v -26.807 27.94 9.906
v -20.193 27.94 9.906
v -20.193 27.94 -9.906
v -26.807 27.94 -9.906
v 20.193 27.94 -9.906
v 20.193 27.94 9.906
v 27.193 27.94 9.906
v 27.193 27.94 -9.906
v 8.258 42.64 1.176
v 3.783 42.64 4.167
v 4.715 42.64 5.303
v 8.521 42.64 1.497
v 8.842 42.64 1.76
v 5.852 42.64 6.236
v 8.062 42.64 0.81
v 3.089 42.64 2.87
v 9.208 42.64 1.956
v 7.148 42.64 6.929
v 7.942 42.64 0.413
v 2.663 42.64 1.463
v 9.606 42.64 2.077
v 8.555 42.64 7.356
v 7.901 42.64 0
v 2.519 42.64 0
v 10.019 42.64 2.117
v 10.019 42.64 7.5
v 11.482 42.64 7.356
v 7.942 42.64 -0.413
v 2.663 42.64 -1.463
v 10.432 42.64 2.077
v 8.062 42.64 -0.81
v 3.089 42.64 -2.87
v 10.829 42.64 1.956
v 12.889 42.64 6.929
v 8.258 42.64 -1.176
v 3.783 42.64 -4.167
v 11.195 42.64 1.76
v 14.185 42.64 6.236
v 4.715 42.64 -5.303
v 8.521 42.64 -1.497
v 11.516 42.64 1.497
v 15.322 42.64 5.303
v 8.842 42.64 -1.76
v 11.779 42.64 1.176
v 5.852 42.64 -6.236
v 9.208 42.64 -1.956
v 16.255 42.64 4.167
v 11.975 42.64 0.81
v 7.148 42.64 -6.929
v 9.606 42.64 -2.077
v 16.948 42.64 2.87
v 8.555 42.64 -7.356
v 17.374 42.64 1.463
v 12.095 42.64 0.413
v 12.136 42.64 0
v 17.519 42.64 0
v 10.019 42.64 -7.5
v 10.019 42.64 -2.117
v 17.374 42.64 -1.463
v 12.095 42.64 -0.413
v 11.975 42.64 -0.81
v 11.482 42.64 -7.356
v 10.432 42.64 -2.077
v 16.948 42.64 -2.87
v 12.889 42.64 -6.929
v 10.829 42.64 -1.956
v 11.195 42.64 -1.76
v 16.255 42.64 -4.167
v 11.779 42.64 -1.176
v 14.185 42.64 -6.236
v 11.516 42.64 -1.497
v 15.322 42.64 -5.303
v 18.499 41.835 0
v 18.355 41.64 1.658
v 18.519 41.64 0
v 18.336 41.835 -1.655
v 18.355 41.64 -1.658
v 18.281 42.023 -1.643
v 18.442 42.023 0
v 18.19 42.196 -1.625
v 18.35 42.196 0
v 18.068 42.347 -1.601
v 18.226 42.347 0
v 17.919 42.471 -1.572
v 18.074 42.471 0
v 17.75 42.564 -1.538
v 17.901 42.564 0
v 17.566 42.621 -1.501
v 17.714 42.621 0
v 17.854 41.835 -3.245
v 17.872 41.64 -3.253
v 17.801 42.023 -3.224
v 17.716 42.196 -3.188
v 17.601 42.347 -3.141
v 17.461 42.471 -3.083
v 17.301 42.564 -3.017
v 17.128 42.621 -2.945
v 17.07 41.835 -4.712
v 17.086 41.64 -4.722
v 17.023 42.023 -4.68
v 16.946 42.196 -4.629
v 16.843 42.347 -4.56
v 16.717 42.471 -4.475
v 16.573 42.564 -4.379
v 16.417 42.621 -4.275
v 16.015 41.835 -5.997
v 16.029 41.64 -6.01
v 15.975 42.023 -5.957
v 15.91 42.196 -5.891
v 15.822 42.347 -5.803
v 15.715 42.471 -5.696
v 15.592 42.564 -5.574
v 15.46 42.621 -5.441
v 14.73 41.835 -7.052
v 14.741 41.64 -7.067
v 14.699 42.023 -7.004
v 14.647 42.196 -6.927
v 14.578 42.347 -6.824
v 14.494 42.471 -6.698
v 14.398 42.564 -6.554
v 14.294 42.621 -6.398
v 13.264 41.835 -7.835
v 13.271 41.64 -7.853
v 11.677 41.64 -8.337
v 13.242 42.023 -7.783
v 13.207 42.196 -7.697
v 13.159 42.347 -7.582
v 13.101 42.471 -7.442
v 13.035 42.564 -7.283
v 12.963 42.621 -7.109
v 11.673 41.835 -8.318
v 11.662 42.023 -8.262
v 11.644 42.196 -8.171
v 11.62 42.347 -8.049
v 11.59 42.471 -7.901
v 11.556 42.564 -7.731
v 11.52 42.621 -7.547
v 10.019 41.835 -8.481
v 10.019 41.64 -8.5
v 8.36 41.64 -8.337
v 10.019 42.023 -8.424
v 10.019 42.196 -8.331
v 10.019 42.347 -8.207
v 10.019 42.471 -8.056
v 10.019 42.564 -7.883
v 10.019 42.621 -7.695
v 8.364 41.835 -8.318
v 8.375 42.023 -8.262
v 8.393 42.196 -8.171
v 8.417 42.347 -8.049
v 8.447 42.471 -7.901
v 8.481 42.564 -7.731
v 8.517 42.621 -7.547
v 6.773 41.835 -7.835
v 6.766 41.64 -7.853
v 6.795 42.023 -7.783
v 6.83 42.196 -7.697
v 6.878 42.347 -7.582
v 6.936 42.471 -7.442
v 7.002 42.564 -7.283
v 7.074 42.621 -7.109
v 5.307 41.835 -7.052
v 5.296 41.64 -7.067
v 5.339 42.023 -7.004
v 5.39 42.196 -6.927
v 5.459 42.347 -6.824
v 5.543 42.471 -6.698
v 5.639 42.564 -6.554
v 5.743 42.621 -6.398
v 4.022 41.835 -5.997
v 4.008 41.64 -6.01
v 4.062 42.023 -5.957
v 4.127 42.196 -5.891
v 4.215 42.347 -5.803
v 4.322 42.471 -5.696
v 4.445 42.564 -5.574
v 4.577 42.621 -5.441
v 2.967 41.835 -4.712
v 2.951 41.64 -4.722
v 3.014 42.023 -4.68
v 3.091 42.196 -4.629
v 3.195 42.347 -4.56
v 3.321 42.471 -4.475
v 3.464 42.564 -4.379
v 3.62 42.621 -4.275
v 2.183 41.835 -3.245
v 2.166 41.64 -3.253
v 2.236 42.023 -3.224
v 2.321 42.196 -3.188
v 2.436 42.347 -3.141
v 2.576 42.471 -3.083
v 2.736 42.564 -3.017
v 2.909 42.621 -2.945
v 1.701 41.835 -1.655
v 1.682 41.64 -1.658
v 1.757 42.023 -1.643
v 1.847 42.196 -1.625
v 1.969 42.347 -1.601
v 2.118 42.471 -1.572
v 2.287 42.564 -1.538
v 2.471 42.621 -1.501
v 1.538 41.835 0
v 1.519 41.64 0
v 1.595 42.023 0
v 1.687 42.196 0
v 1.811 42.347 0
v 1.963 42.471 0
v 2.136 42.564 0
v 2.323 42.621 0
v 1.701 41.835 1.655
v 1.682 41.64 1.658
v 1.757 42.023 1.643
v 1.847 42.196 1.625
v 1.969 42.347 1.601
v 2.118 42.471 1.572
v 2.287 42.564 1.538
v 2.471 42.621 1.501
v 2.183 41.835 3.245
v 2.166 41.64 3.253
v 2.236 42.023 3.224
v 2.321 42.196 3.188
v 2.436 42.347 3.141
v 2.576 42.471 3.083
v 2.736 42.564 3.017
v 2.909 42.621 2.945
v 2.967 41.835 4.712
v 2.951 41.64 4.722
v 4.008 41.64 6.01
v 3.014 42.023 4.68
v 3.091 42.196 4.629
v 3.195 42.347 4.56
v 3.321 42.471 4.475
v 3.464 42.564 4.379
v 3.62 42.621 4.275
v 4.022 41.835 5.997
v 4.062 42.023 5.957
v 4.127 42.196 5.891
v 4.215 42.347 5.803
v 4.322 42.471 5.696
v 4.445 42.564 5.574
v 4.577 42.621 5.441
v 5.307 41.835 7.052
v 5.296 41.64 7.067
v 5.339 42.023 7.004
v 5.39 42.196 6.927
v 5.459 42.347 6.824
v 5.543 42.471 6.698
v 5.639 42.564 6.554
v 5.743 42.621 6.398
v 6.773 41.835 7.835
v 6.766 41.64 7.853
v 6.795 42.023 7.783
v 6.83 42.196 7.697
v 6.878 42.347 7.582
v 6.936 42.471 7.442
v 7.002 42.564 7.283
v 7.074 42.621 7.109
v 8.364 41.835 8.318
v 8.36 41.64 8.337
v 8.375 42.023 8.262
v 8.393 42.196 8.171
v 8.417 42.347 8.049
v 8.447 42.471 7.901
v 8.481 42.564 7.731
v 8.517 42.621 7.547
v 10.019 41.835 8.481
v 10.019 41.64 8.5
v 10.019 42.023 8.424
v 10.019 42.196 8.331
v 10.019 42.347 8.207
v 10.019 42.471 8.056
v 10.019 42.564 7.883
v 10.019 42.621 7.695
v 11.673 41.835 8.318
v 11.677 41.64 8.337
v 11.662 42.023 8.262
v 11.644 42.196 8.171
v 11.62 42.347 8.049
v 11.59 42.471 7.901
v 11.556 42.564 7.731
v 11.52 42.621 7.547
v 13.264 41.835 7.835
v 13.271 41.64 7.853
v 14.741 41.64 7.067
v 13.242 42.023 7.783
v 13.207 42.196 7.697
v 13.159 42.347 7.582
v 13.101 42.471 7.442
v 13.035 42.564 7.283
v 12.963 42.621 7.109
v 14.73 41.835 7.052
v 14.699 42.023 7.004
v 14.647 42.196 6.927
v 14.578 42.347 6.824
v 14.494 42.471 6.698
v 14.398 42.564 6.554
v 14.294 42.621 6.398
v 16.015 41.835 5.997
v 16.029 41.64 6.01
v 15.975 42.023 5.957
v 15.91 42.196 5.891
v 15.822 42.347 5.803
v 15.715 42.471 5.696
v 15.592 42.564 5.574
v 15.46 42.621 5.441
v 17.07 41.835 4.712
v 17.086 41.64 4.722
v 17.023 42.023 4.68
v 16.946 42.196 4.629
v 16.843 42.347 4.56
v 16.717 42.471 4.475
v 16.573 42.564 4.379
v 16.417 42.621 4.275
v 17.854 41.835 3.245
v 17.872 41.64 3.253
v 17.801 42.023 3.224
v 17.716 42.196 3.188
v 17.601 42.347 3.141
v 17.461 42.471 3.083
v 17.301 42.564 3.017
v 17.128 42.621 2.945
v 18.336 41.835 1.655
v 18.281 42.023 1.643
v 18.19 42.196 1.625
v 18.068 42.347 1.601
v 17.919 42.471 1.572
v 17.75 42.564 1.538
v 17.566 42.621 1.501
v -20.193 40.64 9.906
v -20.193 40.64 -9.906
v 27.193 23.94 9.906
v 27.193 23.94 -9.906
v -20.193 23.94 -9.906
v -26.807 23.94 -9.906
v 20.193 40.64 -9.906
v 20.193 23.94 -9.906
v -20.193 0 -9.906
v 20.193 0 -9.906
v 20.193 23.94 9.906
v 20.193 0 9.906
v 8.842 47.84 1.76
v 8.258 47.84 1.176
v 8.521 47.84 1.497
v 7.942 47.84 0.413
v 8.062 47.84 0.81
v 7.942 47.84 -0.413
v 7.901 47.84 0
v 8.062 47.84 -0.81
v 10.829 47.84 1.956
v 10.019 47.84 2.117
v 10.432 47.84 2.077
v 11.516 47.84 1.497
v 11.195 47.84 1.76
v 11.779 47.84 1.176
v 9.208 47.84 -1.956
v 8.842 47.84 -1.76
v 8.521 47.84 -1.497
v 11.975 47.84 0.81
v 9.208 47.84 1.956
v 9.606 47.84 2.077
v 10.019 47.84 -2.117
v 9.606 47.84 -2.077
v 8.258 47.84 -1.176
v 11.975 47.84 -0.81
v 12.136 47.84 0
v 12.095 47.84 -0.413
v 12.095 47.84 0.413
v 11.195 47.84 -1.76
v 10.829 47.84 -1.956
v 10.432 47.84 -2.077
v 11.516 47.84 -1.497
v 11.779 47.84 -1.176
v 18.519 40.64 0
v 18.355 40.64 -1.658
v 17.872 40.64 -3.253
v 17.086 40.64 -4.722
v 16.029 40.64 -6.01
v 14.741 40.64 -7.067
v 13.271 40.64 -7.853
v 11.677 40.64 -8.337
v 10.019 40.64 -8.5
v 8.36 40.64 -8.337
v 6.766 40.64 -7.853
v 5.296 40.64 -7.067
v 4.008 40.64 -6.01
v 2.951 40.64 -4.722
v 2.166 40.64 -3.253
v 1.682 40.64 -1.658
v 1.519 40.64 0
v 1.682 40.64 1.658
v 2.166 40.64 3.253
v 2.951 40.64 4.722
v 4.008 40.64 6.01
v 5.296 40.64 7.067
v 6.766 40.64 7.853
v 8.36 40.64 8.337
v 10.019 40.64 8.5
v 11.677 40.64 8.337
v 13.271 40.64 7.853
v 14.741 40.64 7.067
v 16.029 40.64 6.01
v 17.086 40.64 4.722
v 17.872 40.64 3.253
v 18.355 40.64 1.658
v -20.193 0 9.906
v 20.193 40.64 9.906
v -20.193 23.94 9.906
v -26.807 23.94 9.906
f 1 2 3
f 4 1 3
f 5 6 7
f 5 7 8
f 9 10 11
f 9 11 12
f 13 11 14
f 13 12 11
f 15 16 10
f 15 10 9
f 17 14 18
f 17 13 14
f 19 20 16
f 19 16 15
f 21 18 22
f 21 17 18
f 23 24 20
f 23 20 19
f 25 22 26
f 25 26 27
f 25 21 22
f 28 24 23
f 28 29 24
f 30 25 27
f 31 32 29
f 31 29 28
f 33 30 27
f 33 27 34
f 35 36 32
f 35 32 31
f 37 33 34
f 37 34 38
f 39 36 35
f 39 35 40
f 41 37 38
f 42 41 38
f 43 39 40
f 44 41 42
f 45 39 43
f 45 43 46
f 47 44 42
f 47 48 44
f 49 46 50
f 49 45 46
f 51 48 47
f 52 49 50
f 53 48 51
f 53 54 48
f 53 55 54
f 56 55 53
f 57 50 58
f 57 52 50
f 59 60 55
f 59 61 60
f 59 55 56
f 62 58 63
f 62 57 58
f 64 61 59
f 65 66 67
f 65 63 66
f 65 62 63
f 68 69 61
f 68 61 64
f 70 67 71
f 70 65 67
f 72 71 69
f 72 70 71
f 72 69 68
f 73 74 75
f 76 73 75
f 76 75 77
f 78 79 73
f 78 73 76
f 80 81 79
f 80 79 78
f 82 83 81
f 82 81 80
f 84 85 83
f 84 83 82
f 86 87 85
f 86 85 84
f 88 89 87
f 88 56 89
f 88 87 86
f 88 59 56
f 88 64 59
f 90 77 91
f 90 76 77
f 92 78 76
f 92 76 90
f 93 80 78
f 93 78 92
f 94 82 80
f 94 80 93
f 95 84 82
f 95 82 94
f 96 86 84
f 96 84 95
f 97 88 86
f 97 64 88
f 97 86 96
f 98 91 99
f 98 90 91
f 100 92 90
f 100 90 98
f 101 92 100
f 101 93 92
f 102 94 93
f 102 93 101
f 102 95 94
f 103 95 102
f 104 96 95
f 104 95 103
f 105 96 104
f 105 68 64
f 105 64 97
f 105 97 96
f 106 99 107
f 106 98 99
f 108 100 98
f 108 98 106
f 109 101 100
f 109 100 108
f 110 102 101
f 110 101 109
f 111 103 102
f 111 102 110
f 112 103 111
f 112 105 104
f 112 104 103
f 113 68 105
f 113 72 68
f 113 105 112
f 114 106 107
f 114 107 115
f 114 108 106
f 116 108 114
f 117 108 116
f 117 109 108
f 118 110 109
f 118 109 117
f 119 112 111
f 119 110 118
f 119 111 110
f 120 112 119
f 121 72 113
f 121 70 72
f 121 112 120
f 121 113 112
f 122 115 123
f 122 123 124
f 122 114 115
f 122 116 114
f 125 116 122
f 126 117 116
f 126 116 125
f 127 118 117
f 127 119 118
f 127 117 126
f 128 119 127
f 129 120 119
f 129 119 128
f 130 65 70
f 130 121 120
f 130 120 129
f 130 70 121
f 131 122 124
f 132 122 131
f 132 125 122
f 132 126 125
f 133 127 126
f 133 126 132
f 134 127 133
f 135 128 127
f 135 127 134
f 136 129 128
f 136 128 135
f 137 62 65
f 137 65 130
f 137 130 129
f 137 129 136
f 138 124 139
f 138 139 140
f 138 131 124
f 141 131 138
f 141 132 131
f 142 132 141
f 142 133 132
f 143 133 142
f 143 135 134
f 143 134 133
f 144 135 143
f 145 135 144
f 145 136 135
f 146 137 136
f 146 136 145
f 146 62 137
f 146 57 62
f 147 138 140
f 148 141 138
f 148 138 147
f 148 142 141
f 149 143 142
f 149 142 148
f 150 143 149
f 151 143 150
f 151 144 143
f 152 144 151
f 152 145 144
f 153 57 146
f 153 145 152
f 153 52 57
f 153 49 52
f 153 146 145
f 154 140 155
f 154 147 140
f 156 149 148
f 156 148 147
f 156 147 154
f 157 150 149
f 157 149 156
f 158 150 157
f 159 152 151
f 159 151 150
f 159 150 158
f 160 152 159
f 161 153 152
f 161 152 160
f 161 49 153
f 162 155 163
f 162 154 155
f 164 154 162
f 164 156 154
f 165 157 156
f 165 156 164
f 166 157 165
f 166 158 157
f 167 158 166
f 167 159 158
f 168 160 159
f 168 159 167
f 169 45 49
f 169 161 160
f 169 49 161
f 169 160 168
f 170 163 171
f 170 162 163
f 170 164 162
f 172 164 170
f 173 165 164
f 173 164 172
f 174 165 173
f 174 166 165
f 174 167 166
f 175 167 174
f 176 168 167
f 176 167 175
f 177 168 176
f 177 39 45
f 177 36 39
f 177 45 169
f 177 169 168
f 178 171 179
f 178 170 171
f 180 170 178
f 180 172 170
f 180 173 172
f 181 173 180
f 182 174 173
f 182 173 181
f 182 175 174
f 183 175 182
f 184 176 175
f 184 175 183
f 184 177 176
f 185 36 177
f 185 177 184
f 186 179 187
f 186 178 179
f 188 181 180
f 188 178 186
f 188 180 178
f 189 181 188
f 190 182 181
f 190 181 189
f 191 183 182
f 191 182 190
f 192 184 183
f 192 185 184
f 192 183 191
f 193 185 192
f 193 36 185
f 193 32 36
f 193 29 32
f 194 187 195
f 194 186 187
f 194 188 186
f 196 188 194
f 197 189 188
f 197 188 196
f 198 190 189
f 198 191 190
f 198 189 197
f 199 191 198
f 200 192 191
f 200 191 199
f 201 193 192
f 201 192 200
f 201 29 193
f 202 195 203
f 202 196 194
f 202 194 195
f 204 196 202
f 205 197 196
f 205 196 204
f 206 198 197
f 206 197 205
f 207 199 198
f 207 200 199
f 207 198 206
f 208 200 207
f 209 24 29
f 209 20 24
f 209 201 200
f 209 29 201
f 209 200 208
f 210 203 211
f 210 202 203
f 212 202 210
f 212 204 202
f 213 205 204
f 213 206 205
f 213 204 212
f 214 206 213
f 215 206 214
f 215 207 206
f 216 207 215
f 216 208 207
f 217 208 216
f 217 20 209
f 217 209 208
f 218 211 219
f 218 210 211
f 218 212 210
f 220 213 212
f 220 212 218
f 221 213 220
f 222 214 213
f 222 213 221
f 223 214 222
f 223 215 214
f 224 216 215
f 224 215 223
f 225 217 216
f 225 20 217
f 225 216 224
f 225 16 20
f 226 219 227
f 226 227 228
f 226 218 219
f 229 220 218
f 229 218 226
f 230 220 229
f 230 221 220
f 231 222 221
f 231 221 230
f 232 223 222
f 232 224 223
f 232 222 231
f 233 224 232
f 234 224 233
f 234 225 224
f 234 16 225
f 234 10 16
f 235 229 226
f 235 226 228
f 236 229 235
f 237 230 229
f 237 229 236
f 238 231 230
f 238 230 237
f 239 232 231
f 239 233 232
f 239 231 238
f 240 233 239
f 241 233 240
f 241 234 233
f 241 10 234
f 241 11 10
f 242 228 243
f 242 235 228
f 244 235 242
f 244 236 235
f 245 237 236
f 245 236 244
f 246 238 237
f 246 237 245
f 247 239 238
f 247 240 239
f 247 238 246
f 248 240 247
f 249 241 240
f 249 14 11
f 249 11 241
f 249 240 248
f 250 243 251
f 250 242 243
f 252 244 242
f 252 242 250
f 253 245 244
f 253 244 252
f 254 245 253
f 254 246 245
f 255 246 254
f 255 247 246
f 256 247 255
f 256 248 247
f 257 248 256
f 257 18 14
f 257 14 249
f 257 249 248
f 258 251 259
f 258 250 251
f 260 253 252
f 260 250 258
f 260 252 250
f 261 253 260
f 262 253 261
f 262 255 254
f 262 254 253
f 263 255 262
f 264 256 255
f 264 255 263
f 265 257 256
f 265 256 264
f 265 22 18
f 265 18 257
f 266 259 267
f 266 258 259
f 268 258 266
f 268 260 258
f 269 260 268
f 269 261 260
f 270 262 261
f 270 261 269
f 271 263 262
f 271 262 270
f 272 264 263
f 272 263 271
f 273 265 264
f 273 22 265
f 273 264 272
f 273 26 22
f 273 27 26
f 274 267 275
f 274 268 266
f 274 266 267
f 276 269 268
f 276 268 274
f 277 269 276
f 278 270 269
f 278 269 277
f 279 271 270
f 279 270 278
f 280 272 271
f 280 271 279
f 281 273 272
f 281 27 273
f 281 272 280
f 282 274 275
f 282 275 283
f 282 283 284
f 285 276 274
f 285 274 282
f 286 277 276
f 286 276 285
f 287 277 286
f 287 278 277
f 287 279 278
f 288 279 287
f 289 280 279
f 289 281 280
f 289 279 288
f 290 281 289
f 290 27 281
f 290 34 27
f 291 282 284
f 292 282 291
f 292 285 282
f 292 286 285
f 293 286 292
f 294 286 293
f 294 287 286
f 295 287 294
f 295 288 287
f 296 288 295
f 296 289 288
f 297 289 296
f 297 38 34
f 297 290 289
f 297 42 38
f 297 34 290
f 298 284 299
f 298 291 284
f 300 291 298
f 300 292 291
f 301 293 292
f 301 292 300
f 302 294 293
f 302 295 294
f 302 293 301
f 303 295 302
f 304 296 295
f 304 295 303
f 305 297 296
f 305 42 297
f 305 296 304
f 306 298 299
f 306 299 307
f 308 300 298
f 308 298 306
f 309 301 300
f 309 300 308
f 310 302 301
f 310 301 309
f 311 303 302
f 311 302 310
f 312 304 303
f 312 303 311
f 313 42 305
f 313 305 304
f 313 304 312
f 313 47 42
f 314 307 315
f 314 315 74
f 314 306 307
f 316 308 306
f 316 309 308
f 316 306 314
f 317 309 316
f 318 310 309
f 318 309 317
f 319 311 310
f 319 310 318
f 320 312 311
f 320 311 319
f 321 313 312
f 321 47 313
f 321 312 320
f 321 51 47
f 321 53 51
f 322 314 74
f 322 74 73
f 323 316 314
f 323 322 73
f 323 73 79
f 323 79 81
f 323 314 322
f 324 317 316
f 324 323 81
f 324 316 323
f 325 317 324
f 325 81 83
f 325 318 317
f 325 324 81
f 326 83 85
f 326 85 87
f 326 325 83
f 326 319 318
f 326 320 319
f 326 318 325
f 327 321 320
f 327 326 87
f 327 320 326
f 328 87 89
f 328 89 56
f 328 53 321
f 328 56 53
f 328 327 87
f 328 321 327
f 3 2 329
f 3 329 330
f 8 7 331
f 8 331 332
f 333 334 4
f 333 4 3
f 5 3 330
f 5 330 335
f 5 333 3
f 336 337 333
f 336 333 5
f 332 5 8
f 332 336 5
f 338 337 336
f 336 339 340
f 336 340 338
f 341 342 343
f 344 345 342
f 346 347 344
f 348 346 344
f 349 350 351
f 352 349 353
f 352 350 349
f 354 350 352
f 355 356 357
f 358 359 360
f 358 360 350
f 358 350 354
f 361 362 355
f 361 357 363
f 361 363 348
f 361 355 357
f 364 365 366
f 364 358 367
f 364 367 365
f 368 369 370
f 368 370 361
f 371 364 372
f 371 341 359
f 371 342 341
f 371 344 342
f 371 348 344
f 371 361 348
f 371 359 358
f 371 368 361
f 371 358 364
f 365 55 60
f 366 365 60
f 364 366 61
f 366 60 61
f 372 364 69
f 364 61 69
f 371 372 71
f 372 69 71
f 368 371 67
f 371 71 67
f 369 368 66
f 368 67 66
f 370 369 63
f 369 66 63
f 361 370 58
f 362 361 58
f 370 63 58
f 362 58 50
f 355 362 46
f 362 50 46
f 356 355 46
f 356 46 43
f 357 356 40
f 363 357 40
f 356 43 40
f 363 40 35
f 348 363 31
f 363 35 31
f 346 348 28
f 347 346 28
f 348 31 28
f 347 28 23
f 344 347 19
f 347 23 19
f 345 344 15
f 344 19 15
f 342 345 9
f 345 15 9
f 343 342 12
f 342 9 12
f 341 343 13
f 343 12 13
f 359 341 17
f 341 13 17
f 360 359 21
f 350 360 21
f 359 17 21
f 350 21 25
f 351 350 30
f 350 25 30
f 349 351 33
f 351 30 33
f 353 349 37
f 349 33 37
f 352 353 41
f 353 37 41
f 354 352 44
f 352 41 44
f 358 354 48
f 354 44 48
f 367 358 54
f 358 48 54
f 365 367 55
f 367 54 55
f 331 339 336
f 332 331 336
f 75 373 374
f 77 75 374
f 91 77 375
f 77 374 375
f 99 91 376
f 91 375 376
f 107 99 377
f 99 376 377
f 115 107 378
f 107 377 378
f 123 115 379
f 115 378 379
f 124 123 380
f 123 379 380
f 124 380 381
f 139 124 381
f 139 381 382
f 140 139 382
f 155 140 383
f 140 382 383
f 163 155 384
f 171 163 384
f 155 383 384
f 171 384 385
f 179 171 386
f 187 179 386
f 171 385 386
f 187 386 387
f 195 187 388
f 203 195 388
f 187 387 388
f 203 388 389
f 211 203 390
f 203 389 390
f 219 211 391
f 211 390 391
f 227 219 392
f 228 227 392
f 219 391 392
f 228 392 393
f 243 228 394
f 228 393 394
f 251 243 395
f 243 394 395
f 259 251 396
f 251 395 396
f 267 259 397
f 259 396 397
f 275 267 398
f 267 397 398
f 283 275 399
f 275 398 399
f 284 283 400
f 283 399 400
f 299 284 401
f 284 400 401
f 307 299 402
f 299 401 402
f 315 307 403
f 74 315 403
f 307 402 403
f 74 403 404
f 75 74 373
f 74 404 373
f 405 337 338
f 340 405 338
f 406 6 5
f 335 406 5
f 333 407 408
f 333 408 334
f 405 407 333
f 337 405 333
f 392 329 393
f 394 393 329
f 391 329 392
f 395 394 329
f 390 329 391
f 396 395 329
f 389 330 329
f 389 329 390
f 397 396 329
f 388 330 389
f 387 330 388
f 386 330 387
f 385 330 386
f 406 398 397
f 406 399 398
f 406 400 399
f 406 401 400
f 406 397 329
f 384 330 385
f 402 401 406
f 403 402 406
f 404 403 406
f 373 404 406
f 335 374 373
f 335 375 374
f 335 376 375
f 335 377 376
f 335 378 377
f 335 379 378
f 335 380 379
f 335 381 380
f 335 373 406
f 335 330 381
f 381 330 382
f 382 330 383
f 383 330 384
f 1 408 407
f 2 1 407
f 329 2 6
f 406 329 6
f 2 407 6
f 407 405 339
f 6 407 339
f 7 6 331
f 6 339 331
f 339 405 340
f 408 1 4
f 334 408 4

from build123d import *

# Parameters (mm, degrees)
SKETCH1_W                = 40.386
SKETCH1_H                = 19.812
BOSS_EXTRUDE1_DEPTH      = 40.64
SKETCH2_W                = 19.812
SKETCH2_H                = 4
BOSS_EXTRUDE2_DEPTH      = 7
BOSS_EXTRUDE2_DEPTH_BACK = 47
SKETCH3_R                = 8.5
BOSS_EXTRUDE3_DEPTH      = 2
FILLET1_R                = 1
SKETCH4_R                = 2.117245373
BOSS_EXTRUDE4_DEPTH      = 5.2


with BuildPart() as part:
    # Sketch1 → Boss-Extrude1 (new body)
    with BuildSketch(Plane(origin=(0, 0, 0), x_dir=(1, 0, 0), z_dir=(0, 1, 0))):
        Rectangle(SKETCH1_W, SKETCH1_H)
    extrude(amount=BOSS_EXTRUDE1_DEPTH)

    # Sketch2 → Boss-Extrude2 (add, two sides)
    with BuildSketch(Plane(origin=(20.193, 0, 0), x_dir=(0, 0, -1), z_dir=(1, 0, 0))) as boss_extrude2_sk:
        with Locations((0, 25.94)):
            Rectangle(SKETCH2_W, SKETCH2_H)
    extrude(amount=BOSS_EXTRUDE2_DEPTH)
    extrude(boss_extrude2_sk.sketch, amount=-BOSS_EXTRUDE2_DEPTH_BACK)

    # Sketch3 → Boss-Extrude3 (add)
    with BuildSketch(Plane(origin=(0, 40.64, 0), x_dir=(1, 0, 0), z_dir=(0, 1, 0))):
        with Locations((10.018571985, 0)):
            Circle(SKETCH3_R)
    extrude(amount=BOSS_EXTRUDE3_DEPTH)

    # Fillet1
    fillet1_edges = [part.edges().sort_by_distance(p)[0] for p in [
        (1.518571985, 42.64, 0),
    ]]
    fillet(fillet1_edges, radius=FILLET1_R)

    # Sketch4 → Boss-Extrude4 (add)
    with BuildSketch(Plane(origin=(0, 42.64, 0), x_dir=(1, 0, 0), z_dir=(0, 1, 0))):
        with Locations((10.018571985, 0)):
            Circle(SKETCH4_R)
    extrude(amount=BOSS_EXTRUDE4_DEPTH)


solid = part.part
